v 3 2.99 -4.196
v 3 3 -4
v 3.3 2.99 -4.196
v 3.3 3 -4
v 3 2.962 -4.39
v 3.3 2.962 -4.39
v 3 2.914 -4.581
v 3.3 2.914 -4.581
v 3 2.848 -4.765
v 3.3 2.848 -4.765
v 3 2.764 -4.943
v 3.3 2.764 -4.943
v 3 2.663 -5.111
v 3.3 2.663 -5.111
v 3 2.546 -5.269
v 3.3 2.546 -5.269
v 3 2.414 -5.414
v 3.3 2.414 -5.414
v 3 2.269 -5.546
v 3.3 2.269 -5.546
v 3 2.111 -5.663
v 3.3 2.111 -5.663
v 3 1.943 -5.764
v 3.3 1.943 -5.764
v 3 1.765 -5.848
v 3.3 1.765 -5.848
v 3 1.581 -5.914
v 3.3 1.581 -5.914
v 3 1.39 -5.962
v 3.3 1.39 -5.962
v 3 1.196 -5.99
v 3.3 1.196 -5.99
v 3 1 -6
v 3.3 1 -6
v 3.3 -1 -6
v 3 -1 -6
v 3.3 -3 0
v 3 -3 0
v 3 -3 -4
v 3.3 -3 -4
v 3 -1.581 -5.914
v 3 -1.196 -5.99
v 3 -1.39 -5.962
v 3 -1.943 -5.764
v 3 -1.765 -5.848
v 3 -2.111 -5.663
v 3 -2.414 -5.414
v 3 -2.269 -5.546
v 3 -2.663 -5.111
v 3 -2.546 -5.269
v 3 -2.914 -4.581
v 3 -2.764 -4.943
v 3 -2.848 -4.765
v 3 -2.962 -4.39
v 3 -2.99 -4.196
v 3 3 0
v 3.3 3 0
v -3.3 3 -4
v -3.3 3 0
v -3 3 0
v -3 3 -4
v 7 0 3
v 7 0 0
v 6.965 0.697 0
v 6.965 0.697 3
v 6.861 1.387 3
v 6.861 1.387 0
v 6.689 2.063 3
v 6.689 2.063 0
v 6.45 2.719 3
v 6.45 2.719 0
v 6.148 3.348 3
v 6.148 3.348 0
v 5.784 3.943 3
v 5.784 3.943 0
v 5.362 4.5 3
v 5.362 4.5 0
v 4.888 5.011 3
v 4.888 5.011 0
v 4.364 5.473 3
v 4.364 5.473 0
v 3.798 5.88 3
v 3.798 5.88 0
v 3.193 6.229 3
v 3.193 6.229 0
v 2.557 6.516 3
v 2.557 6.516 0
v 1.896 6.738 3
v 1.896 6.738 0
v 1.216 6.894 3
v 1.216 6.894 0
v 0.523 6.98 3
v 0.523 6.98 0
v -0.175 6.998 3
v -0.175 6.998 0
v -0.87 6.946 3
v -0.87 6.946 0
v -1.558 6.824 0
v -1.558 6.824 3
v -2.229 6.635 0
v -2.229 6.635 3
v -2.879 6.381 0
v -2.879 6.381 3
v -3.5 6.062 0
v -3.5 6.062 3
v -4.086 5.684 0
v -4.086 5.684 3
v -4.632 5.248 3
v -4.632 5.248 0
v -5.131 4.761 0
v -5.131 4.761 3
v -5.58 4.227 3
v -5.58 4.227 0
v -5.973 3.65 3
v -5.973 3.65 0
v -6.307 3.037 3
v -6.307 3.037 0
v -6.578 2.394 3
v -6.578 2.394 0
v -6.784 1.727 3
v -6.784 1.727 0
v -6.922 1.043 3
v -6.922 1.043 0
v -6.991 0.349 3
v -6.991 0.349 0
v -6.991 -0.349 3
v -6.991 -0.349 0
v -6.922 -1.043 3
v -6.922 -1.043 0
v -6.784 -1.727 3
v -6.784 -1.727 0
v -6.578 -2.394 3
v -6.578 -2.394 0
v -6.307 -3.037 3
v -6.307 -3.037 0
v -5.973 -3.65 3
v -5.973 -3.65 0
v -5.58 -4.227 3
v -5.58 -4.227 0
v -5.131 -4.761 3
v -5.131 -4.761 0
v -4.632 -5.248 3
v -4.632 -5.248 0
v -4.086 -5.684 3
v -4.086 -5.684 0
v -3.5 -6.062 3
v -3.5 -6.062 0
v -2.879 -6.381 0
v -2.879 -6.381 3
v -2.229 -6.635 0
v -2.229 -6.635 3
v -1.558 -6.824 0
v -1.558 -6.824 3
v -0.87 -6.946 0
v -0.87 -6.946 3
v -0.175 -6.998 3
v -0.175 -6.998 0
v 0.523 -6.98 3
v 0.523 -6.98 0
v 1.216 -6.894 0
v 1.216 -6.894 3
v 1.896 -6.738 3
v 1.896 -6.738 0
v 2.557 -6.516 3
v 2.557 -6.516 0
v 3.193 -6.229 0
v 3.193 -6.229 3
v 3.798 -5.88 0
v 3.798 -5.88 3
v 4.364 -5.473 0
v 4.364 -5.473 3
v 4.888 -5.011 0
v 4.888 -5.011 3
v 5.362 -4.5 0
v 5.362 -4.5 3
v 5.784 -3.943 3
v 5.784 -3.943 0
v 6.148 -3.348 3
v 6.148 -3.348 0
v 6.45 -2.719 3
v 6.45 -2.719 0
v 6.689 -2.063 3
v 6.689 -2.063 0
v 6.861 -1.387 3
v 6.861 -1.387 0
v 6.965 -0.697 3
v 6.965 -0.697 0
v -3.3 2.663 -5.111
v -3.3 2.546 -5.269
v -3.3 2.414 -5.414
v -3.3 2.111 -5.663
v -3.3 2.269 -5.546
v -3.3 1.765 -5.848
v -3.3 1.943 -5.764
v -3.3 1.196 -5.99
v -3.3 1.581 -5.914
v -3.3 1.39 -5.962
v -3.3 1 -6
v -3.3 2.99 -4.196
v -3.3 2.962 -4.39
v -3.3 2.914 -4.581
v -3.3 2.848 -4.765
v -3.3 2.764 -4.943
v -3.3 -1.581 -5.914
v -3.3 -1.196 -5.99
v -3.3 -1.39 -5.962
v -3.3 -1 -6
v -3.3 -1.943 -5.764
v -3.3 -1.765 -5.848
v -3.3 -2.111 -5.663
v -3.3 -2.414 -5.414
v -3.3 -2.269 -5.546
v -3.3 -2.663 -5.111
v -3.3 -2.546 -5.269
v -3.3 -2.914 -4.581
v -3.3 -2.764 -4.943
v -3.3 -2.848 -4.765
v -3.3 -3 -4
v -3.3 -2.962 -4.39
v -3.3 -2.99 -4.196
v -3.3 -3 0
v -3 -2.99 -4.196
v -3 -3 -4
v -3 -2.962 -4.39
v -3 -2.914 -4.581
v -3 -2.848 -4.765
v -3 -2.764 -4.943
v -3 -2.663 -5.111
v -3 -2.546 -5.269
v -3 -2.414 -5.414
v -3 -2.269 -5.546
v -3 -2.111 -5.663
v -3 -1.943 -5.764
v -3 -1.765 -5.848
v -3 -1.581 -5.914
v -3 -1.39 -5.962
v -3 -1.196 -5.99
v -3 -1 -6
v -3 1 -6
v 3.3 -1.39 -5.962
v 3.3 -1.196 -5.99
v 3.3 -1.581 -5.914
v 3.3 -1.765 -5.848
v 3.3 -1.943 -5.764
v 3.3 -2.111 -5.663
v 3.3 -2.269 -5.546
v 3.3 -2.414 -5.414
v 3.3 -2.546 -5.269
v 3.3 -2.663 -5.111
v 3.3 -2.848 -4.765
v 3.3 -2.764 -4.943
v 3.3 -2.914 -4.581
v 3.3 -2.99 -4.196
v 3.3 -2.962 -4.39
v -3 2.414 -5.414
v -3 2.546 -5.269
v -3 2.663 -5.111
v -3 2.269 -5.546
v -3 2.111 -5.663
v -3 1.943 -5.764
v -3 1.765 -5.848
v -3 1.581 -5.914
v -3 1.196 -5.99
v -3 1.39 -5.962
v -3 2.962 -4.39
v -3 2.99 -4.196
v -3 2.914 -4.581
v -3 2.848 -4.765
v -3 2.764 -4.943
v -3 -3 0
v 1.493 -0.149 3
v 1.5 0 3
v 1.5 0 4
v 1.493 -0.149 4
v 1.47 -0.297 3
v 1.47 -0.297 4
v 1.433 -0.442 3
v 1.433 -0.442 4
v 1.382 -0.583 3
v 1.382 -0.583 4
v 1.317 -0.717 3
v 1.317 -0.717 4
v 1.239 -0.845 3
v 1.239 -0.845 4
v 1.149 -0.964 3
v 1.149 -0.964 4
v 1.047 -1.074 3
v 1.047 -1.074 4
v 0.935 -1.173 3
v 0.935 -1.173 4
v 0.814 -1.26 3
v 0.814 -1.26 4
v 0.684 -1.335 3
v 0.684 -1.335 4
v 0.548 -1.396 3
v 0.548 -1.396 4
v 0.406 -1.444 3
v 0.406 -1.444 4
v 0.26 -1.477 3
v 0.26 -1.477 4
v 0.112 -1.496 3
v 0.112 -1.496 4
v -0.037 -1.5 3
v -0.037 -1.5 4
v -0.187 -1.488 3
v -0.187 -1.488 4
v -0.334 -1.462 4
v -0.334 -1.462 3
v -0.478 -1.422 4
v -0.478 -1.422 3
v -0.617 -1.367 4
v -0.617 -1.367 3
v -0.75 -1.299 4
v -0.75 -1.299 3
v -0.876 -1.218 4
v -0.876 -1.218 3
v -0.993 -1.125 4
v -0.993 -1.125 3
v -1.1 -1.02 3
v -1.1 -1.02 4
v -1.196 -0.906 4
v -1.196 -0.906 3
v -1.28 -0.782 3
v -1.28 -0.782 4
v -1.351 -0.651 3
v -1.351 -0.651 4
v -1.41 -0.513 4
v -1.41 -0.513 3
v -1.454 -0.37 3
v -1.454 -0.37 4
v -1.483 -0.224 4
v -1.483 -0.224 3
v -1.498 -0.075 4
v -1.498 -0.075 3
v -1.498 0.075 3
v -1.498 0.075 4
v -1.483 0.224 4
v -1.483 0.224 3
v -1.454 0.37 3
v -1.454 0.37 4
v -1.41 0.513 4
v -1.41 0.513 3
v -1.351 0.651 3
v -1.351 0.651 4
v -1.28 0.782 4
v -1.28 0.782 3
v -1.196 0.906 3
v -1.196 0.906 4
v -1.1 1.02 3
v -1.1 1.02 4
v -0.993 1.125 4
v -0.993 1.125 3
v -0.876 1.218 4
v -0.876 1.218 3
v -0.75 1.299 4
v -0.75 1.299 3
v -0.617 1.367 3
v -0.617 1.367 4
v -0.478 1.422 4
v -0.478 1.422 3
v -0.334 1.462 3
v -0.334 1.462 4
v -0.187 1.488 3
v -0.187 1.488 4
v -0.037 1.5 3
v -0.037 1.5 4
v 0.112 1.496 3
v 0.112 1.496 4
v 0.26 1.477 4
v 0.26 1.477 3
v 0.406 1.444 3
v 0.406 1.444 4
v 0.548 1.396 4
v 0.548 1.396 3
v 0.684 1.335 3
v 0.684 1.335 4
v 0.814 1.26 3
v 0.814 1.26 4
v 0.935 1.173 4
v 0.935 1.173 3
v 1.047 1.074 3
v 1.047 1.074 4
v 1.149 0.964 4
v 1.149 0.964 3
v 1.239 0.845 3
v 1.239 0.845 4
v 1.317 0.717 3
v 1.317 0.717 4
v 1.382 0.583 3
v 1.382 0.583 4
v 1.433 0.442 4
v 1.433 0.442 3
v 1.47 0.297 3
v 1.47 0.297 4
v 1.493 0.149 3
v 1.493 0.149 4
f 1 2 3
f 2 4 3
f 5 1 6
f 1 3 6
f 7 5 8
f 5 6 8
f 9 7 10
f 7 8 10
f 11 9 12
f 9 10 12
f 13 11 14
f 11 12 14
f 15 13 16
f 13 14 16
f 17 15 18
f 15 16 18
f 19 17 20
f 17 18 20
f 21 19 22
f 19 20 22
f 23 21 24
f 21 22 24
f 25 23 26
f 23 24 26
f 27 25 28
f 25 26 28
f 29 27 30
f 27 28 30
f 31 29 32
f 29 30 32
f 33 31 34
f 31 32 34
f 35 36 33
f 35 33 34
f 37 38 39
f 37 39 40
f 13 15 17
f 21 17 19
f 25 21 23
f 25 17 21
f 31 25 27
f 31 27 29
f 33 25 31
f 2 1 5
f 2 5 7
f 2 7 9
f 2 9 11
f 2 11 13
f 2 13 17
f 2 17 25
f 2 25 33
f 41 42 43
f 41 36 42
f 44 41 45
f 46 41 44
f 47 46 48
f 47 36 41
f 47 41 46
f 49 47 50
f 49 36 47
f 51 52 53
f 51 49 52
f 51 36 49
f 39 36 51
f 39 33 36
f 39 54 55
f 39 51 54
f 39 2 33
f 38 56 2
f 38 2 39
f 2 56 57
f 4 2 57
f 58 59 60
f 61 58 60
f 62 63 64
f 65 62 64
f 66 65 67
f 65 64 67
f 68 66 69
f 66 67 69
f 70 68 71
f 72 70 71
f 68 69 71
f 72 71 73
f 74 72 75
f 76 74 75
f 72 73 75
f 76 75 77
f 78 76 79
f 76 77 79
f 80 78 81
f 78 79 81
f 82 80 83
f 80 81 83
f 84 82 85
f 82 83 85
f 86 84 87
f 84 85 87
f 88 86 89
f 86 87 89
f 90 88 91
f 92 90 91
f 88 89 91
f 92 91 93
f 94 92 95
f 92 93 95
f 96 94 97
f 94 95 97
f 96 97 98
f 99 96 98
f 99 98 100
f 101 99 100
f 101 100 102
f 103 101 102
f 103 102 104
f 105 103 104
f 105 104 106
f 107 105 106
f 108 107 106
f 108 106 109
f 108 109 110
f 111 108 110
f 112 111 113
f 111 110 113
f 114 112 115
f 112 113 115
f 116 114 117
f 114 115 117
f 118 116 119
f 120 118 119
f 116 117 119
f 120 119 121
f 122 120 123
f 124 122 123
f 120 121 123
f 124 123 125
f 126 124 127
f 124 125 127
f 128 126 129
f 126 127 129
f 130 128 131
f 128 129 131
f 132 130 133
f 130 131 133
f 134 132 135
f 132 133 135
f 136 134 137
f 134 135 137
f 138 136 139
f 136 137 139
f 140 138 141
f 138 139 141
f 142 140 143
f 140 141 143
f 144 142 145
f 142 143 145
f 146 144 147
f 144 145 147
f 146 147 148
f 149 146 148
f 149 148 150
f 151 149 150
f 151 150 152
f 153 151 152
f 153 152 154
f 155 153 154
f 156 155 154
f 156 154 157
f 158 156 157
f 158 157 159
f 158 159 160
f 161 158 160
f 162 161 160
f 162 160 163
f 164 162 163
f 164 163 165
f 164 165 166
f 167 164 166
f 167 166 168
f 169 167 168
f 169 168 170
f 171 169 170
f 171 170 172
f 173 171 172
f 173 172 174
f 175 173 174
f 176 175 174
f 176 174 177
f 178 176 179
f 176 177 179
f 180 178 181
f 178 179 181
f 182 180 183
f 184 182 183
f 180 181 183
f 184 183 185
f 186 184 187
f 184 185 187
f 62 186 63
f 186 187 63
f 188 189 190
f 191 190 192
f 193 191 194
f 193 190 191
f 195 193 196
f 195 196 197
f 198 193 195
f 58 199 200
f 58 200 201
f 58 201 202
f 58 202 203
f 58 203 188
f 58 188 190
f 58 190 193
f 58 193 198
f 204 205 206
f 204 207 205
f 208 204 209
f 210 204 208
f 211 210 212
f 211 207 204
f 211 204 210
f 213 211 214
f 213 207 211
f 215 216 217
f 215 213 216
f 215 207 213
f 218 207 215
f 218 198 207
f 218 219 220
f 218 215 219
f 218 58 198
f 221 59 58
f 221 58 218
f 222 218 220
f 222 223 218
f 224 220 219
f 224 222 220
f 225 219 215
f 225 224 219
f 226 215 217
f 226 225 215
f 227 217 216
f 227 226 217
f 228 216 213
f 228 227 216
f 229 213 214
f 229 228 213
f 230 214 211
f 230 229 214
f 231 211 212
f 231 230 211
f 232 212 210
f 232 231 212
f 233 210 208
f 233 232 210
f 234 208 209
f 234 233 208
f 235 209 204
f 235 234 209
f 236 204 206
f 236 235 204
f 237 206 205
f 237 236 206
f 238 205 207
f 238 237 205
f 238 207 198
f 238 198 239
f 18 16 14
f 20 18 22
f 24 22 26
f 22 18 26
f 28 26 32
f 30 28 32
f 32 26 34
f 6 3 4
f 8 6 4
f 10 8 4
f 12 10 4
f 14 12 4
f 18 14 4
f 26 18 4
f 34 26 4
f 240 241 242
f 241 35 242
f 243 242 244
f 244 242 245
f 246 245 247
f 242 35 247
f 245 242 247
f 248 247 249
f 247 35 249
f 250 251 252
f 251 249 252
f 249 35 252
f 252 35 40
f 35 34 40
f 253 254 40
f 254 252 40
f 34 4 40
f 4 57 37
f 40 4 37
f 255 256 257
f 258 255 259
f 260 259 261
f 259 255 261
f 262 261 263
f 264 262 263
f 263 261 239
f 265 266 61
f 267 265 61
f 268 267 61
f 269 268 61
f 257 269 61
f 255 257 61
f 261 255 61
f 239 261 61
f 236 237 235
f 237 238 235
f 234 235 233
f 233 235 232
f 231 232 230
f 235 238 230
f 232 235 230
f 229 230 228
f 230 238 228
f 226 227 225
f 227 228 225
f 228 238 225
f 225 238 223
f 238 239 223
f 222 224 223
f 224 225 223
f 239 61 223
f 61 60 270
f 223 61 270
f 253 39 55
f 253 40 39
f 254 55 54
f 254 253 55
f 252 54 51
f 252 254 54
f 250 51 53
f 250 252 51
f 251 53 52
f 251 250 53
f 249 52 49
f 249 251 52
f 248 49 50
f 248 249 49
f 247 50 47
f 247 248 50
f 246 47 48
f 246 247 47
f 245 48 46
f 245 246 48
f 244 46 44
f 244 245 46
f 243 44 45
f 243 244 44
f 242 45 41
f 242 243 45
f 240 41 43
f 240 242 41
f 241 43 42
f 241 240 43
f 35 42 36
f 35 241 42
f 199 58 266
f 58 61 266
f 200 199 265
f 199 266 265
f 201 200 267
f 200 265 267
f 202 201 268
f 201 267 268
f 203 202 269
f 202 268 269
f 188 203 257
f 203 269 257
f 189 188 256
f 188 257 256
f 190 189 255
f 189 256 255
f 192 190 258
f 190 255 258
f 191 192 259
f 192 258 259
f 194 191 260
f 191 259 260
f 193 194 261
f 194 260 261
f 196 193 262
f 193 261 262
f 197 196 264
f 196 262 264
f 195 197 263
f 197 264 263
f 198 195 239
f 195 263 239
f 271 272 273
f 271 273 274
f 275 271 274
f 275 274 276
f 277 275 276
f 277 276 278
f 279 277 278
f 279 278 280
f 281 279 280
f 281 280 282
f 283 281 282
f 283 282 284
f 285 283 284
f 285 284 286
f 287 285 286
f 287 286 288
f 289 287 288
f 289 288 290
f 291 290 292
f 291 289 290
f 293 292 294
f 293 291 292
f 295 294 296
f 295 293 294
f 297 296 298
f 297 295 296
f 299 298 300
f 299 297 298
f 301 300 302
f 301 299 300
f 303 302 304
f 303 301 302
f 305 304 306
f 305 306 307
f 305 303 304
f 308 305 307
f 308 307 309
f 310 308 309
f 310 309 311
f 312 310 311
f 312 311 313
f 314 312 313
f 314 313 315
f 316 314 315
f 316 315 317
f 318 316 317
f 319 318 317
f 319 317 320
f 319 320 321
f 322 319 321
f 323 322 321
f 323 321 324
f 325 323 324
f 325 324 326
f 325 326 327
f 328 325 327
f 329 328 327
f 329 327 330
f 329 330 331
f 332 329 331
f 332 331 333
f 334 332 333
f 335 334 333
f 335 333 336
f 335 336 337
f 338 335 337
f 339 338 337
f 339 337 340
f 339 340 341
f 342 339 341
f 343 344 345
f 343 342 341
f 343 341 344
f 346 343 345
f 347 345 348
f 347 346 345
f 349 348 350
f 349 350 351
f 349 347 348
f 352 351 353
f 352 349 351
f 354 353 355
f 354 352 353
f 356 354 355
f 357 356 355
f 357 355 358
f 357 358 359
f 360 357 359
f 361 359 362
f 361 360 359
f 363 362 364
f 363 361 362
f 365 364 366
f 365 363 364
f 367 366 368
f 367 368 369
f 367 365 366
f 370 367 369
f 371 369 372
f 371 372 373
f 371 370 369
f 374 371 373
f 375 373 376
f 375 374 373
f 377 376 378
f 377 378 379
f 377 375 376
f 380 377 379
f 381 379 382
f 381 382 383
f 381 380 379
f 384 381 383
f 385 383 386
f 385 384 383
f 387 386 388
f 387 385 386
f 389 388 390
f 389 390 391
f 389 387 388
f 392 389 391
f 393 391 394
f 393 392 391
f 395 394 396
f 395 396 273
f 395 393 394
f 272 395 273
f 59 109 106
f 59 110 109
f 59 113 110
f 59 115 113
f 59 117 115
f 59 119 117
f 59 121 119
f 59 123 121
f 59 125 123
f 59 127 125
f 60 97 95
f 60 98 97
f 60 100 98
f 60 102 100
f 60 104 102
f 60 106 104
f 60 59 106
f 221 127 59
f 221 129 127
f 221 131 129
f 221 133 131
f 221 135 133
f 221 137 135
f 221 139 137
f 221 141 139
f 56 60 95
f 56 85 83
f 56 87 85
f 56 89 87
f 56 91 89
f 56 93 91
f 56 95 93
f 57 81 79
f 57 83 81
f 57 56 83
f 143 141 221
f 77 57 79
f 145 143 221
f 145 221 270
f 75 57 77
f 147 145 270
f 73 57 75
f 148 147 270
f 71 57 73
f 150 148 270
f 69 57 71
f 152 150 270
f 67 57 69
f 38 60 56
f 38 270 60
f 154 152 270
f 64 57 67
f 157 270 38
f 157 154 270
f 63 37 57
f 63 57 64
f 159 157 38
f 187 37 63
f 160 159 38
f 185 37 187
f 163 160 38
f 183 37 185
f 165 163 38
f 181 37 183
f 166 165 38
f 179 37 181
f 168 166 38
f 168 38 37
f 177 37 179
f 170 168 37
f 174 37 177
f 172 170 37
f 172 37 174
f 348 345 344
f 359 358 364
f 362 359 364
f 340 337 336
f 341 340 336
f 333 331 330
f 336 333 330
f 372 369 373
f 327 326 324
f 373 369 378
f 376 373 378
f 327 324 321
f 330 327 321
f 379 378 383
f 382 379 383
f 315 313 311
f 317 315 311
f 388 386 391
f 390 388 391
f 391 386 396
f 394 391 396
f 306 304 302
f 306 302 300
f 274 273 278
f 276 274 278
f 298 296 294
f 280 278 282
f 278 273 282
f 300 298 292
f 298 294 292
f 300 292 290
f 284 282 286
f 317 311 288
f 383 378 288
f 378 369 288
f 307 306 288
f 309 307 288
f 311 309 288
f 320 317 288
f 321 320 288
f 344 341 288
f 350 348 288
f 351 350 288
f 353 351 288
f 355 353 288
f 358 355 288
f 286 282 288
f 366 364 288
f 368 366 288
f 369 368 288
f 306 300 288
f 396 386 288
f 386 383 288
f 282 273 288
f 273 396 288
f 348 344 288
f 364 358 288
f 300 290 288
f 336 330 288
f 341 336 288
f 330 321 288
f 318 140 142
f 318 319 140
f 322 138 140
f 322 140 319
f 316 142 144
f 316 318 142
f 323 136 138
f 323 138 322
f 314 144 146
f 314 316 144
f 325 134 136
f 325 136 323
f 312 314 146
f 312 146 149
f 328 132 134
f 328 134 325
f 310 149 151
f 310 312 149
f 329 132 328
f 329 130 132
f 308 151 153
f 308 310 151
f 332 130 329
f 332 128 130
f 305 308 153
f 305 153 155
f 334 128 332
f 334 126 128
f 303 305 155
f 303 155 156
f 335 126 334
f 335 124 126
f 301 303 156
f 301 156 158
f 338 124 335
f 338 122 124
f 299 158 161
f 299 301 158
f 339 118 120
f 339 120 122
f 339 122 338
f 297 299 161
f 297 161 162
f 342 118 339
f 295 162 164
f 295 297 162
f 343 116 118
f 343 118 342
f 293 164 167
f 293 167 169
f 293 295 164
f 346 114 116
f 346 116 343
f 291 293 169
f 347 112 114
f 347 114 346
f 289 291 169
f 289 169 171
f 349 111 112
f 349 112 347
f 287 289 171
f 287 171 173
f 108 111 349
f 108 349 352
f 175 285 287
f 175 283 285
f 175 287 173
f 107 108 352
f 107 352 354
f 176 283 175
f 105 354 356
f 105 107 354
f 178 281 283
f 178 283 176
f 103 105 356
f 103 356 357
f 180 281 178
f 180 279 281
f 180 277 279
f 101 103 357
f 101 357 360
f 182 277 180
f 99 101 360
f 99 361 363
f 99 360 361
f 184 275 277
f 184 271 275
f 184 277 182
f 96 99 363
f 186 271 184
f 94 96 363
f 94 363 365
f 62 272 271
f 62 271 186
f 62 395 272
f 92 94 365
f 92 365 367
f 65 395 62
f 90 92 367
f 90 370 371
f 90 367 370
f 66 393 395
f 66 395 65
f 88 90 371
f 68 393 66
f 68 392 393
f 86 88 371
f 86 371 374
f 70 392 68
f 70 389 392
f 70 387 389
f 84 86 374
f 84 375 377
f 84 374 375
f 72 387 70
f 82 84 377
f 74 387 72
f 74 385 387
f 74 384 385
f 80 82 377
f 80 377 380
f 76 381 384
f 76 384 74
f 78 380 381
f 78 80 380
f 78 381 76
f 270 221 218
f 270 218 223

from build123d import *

# Parameters (mm, degrees)
F0_R     = 7
F0_R_2   = 1.5
F1_DEPTH = 3
F2_R     = 1.551902
F3_DEPTH = 1.5
F4_W     = 0.3
F4_H     = 6
F5_DEPTH = 6
F6_R     = 2
F7_R     = 1.5
F8_DEPTH = 4


with BuildPart() as f1:
    # F0 (on Top) → F1 (new body)
    with BuildSketch(Plane.XY):
        Circle(F0_R)
        Circle(F0_R_2, mode=Mode.SUBTRACT)
    extrude(amount=F1_DEPTH)

    # F2 (on face) → F3 (join)
    with BuildSketch(Plane(origin=(0, 0, 0), x_dir=(1, 0, 0), z_dir=(0, 0, -1))):
        Circle(F2_R)
    extrude(amount=-F3_DEPTH)

    # F4 (on face) → F5 (join)
    with BuildSketch(Plane(origin=(0, 0, 0), x_dir=(1, 0, 0), z_dir=(0, 0, -1))):
        with Locations((-3.15, 0)):
            Rectangle(F4_W, F4_H)
        with Locations((3.15, 0)):
            Rectangle(F4_W, F4_H)
    extrude(amount=F5_DEPTH)

    # F6
    f6_edges = [f1.edges().sort_by_distance(p)[0] for p in [
        (-3.15, -3, -6),
        (-3.15, 3, -6),
        (3.15, 3, -6),
        (3.15, -3, -6),
    ]]
    fillet(f6_edges, radius=F6_R)

    # F7 (on face) → F8 (join)
    with BuildSketch(Plane(origin=(0, 0, 0), x_dir=(1, 0, 0), z_dir=(0, 0, -1))):
        Circle(F7_R)
    extrude(amount=-F8_DEPTH)


solid = f1.part
